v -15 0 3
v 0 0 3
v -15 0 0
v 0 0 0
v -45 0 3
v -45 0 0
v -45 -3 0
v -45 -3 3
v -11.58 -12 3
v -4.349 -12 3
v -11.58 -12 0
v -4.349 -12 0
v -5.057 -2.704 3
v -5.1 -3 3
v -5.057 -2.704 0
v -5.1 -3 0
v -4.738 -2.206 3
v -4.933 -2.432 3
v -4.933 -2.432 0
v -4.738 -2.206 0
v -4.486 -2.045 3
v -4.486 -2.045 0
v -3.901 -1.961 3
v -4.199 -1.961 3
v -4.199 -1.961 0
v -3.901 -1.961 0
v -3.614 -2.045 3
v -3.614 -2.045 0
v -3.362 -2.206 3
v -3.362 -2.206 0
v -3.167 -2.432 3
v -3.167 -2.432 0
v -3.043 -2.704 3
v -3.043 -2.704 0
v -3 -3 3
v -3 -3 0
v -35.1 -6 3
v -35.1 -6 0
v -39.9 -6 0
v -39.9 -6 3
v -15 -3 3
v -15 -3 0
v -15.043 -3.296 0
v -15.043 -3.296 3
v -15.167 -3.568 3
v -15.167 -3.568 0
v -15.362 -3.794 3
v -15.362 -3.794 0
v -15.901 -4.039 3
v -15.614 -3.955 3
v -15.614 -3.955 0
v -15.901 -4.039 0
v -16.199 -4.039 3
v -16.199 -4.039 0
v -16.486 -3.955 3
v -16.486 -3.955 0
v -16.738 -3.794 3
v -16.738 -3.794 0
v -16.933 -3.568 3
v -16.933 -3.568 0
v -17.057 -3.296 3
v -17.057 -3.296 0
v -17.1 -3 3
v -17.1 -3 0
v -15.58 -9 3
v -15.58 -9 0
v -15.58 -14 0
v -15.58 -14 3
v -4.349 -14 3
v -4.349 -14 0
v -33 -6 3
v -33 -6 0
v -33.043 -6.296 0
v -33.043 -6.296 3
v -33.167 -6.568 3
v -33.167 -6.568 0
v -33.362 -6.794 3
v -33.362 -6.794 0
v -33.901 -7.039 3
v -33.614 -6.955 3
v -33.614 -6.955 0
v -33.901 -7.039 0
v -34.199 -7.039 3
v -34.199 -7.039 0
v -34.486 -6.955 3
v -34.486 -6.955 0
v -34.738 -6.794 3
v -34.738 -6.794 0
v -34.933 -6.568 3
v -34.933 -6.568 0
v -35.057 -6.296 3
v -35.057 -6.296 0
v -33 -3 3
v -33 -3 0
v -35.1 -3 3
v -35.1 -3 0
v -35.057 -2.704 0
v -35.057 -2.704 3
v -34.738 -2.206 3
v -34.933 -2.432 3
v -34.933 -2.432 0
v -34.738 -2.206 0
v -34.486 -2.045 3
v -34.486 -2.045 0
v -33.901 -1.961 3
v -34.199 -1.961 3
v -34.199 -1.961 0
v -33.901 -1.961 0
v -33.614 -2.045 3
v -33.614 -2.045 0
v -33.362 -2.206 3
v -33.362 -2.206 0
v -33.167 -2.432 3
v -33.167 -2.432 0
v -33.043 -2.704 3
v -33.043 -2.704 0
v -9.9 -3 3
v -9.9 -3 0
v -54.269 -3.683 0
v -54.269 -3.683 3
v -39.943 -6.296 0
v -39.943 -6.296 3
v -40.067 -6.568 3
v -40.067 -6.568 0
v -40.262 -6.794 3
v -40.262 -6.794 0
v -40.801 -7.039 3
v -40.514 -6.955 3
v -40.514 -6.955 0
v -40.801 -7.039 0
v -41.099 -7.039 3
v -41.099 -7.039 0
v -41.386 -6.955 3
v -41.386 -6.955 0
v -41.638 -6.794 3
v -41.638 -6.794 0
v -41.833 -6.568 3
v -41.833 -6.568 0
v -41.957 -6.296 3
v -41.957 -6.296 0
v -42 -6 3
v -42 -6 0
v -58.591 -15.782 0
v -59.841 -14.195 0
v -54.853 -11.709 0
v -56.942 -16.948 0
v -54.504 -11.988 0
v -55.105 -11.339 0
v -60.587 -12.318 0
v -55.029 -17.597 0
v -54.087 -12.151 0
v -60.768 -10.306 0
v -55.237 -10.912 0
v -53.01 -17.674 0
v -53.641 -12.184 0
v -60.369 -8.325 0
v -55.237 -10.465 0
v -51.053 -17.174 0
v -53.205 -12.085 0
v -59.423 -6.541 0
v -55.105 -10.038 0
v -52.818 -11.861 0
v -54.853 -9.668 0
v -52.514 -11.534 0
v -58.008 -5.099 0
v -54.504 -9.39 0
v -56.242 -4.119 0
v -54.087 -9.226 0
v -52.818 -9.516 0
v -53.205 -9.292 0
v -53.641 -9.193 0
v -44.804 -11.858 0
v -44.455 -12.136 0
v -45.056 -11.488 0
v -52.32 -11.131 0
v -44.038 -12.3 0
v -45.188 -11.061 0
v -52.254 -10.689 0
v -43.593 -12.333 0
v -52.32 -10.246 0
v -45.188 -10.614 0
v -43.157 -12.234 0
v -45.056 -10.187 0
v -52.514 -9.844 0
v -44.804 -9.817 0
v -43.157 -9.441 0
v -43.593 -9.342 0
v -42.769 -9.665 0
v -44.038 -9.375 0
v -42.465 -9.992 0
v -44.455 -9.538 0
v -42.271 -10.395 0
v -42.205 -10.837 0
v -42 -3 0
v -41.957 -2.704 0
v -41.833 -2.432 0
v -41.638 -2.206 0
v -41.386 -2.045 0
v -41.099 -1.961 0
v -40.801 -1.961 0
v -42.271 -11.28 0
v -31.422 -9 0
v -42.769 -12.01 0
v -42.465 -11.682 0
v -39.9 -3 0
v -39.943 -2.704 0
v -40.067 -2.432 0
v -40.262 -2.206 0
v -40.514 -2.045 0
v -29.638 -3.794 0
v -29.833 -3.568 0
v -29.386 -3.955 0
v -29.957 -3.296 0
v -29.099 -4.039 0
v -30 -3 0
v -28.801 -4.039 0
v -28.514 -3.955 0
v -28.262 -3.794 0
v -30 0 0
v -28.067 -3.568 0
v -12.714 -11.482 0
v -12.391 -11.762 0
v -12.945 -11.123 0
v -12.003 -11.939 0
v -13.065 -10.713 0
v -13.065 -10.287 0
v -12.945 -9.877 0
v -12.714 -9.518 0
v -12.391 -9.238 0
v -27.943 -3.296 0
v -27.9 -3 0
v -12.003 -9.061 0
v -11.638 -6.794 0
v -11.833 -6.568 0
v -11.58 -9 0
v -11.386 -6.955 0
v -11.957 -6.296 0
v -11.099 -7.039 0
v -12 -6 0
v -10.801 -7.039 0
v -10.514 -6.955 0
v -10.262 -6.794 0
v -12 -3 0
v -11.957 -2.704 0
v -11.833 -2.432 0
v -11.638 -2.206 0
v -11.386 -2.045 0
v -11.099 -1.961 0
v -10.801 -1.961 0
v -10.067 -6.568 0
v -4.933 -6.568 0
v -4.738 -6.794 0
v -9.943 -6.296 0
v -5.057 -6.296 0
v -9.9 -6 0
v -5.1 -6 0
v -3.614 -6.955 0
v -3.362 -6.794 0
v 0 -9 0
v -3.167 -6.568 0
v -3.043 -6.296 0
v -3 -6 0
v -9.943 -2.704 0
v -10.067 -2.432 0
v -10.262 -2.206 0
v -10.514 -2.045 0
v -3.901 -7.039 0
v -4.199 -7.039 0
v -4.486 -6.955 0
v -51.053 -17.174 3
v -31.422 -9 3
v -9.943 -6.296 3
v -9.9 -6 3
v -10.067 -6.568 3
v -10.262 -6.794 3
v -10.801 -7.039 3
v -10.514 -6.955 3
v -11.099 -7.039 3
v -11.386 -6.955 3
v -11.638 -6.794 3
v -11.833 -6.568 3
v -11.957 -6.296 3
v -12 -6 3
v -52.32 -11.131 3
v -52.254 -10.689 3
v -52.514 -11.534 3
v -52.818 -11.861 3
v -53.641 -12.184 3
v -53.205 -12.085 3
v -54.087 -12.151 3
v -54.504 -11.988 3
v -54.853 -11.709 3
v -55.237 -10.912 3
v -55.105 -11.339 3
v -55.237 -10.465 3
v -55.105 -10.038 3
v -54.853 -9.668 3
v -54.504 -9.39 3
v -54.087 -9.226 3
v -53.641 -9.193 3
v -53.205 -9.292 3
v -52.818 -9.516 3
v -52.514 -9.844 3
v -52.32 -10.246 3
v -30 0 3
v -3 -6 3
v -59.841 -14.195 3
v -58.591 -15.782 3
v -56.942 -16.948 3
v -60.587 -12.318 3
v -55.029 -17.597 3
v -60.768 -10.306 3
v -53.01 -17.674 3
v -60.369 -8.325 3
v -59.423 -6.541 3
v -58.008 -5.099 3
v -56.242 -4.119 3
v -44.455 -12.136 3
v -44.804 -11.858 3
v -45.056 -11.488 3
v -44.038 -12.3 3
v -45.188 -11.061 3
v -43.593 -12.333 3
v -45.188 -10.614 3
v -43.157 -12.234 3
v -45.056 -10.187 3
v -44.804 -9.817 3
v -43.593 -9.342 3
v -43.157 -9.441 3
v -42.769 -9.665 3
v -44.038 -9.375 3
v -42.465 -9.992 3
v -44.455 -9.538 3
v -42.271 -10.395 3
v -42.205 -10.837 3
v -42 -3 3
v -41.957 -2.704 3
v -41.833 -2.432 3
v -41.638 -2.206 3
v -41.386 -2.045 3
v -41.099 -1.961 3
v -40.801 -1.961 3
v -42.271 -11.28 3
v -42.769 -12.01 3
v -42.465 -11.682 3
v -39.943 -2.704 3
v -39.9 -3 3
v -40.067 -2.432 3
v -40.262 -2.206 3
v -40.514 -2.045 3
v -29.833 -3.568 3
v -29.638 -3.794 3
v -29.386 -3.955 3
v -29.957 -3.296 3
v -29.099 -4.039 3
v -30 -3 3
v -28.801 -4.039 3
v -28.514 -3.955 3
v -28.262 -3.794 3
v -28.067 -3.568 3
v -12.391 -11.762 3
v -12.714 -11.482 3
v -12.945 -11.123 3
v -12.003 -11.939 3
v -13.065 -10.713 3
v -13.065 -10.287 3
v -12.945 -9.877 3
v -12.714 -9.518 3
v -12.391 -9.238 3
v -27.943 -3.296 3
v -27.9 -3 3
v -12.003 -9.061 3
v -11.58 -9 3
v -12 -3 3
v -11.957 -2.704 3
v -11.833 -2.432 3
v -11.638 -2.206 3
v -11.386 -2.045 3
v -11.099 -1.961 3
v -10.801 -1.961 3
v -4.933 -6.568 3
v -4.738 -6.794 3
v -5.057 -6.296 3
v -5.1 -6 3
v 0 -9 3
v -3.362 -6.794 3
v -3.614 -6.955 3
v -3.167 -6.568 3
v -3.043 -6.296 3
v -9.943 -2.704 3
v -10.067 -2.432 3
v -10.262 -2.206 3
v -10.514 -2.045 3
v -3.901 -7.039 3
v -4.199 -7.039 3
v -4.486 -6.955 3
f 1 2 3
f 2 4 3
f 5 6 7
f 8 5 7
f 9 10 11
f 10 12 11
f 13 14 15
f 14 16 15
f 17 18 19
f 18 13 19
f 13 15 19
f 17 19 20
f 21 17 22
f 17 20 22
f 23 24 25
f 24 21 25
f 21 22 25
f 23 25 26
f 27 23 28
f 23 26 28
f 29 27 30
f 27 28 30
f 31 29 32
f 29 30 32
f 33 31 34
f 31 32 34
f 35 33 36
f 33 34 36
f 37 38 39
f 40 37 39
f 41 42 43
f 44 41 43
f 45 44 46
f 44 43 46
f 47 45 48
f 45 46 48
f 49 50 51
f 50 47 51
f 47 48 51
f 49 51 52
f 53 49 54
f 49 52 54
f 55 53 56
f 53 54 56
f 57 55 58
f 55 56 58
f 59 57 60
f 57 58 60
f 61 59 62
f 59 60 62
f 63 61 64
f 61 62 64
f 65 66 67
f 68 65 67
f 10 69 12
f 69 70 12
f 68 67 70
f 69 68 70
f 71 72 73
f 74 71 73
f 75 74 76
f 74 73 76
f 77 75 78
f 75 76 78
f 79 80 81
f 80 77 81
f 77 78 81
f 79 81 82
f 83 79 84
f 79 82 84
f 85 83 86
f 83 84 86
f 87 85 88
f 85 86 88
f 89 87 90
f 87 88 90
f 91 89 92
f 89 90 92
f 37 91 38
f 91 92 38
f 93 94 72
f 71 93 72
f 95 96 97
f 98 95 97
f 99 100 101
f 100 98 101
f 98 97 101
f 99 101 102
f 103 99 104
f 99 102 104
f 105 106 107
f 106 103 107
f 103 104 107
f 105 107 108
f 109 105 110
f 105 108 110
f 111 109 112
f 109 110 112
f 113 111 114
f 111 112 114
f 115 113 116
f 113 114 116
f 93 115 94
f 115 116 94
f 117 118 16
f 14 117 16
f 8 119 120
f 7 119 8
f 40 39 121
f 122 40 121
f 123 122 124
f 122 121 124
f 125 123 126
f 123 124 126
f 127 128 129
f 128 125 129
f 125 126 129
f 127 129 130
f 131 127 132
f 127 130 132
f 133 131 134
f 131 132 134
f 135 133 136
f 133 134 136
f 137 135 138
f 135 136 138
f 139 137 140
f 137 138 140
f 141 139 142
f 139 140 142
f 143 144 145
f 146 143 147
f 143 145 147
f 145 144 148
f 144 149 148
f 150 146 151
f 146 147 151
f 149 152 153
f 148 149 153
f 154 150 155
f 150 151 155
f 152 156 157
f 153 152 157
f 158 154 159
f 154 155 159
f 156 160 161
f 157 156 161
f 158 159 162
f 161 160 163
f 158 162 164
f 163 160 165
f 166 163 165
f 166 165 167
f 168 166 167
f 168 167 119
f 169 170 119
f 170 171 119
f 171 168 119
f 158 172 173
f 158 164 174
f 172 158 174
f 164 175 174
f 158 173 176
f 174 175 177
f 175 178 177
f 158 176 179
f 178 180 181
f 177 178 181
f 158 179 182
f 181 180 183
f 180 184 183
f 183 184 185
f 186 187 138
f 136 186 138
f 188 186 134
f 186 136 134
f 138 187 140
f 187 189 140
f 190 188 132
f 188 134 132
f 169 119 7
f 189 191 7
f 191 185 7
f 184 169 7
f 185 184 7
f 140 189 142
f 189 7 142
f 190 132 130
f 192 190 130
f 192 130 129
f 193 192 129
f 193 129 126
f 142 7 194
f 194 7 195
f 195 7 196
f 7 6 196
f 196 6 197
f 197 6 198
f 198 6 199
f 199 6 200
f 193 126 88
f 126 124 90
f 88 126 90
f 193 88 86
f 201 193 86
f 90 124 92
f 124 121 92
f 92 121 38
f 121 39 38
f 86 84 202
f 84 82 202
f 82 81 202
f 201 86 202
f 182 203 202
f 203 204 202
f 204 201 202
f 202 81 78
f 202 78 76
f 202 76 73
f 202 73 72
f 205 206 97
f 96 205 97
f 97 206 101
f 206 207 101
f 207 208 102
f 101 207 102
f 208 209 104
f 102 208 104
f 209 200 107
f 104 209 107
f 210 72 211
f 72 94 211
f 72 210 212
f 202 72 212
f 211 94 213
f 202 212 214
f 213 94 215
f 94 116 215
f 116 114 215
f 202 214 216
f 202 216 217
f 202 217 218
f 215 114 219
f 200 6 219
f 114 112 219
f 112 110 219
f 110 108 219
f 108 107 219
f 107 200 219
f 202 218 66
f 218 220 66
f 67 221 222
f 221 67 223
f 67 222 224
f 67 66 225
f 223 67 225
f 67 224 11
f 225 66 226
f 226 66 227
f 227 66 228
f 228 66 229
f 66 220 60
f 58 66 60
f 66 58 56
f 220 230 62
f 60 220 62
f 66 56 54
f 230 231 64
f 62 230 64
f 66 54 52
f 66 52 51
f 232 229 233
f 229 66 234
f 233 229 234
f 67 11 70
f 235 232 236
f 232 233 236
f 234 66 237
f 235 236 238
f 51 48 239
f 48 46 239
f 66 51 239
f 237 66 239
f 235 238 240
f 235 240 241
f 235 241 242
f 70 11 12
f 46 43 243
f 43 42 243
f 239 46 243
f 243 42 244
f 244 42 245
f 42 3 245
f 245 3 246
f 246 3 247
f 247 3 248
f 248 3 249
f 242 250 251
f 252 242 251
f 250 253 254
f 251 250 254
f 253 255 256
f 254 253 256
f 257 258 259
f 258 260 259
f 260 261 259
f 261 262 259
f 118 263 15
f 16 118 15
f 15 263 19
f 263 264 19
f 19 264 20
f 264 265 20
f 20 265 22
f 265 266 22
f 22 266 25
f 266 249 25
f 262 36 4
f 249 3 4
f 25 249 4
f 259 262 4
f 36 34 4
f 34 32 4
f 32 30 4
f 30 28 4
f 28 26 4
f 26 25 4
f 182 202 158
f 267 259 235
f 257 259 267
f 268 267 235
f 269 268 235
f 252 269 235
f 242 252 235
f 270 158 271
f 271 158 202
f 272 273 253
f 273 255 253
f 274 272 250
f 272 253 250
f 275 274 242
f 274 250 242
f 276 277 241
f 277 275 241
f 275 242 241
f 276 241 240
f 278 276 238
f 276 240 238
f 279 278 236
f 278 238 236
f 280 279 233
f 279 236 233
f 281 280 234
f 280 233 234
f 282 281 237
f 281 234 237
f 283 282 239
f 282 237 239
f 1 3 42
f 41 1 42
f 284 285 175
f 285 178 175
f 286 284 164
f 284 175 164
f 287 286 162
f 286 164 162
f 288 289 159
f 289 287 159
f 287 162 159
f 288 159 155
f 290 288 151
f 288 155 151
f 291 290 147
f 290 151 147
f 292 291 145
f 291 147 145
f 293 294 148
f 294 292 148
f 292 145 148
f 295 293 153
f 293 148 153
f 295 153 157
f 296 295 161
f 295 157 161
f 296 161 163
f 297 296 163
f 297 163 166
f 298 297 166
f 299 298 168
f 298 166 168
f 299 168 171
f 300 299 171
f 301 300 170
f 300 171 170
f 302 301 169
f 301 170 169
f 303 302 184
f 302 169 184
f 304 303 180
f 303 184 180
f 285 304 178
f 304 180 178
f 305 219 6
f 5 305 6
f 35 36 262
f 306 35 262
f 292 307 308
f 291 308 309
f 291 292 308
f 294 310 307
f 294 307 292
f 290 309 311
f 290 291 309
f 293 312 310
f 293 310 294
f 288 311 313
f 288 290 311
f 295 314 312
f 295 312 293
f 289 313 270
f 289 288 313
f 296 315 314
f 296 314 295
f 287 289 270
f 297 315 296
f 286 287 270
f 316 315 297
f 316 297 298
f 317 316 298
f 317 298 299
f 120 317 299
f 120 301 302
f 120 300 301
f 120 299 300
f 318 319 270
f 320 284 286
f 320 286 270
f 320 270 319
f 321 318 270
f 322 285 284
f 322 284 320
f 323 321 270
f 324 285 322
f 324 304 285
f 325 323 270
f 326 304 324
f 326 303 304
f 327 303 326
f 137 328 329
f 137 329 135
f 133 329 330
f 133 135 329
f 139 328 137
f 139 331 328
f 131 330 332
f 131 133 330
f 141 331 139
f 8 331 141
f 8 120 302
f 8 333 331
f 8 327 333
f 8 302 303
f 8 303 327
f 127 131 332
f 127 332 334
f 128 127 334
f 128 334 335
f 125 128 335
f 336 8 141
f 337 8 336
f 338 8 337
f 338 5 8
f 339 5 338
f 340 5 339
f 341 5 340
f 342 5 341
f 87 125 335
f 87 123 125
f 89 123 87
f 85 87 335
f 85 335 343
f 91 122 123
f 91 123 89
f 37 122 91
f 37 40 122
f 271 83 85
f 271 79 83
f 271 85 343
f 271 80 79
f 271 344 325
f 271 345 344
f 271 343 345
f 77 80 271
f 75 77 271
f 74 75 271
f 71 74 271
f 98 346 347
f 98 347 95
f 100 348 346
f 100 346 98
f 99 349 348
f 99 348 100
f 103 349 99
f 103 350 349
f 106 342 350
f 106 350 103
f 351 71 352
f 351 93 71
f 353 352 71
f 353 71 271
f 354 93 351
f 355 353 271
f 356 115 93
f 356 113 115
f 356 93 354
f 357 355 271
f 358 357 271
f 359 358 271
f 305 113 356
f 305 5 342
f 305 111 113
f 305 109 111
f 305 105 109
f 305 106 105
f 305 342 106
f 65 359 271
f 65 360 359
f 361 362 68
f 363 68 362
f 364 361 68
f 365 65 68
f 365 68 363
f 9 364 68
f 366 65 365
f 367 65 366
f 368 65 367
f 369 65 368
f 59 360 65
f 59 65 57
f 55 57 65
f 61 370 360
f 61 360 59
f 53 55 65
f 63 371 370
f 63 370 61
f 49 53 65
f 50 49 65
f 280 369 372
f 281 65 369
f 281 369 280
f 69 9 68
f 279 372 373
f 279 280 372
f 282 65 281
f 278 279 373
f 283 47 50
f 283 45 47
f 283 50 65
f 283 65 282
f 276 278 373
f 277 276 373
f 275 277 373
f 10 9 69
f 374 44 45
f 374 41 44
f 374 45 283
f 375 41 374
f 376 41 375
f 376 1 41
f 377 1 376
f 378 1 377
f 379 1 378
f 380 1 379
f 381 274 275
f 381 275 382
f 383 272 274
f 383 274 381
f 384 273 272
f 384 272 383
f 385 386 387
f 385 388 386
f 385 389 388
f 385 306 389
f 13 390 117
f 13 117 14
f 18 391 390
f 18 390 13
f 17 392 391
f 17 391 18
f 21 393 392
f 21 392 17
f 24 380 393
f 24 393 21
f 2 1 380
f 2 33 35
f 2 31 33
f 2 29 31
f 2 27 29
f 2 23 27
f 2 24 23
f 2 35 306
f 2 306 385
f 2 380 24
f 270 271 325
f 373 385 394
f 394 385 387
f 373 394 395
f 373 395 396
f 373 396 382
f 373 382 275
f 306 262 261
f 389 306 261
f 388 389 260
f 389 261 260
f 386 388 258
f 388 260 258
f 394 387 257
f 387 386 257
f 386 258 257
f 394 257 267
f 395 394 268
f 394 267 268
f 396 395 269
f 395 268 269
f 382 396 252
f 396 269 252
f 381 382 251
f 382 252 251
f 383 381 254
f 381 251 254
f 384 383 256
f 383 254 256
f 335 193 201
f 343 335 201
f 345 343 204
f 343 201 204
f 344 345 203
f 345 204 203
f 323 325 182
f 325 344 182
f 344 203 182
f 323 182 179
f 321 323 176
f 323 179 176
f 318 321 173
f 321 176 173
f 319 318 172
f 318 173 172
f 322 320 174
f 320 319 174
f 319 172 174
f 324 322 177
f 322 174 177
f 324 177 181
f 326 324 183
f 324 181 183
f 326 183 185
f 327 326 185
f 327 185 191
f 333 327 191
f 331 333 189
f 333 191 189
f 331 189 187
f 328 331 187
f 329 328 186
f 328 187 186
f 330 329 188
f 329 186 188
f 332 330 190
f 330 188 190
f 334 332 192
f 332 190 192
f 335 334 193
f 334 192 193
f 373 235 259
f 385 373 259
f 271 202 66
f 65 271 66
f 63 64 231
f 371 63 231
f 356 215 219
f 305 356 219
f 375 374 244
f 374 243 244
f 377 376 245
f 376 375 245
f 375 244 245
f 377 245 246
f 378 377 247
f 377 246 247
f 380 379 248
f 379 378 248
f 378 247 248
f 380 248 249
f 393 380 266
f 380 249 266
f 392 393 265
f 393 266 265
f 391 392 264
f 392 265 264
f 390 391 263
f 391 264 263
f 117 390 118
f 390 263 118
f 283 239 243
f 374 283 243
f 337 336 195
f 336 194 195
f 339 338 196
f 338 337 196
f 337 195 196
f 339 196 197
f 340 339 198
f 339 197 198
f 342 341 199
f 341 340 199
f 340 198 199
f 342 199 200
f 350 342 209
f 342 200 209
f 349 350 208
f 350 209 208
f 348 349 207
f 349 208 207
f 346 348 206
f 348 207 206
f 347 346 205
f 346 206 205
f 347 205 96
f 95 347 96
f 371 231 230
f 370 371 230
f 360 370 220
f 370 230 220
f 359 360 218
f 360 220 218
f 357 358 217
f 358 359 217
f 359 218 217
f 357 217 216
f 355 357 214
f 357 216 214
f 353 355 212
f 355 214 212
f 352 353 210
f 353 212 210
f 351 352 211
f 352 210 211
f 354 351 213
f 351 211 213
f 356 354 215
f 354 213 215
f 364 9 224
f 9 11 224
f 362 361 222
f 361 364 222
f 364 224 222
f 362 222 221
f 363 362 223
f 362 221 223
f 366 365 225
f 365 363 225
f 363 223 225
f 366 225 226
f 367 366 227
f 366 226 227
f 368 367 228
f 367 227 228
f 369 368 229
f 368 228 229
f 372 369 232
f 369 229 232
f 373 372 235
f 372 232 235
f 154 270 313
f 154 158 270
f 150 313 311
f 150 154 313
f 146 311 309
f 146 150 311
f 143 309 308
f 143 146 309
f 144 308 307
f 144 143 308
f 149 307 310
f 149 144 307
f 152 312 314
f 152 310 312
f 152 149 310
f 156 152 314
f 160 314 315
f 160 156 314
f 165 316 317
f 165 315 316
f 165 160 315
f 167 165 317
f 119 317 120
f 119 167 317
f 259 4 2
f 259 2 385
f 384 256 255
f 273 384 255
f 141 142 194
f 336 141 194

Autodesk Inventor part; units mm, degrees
ref_plane "YZ Plane" through (0, 0, 0) normal (1, 0, 0) x (0, 1, 0)
ref_plane "XZ Plane" through (0, 0, 0) normal (0, 1, 0) x (-1, 0, 0)
ref_plane "XY Plane" through (0, 0, 0) normal (0, 0, 1) x (1, 0, 0)
sketch "スケッチ1" plane through (0, 0, 0) normal (0, 0, 1) x (1, 0, 0)
  line L0 (0, 0) -> (0, -3)
  line L1 (0, 0) -> (-15, 0)
  line L2 (-15, 0) -> (-15, -3)
  line L3 (-15, -3) -> (-30, -3)
  line L4 (-30, -3) -> (-30, 0)
  line L5 (-30, 0) -> (-45, 0)
  line L6 (-45, 0) -> (-45, -3)
  line L7 (-257.4775, 0) -> (-66.4062, 0)
  line L8 (-66.4062, 0) -> (-51.9242, -3.906)
  line L9 (-257.4775, 0) -> (-257.4775, -3)
  line L10 (-257.4775, -3) -> (-68.9626, -6)
  line L11 (-68.9626, -6) -> (-58.5737, -15.799)
  circle A0 centre (-53.7535, -10.6886) radius 4.025
  circle A1 centre (-53.7535, -10.6886) radius 1.5
  line L12 (0, -3) -> (0, -9)
  arc A2 (-54.2694, -3.6826) -> (-51.0532, -17.1739) centre (-53.7535, -10.6886) ccw
  line L13 (-54.2694, -3.6826) -> (-45, -3)
  line L14 (-51.0532, -17.1739) -> (-31.4218, -9)
  line L15 (-31.4218, -9) -> (0, -9)
  arc A3 (-46.7293, -10.7926) -> (-42.5418, -13.63) centre (-43.7046, -10.8374) ccw
  circle A4 centre (-43.7046, -10.8374) radius 1.5
  line L16 (-54.6828, -17.6519) -> (-41.7856, -19.3732)
  arc A5 (-41.7856, -19.3732) -> (-42.5418, -13.63) centre (-41.3887, -16.3996) ccw
  arc A6 (-58.5737, -15.799) -> (-54.6828, -17.6519) centre (-53.7535, -10.6886) ccw
  arc A7 (-46.7293, -10.7926) -> (-51.9242, -3.906) centre (-53.7535, -10.6886) ccw
  line L17 (-42, -3) -> (-33, -3)
  line L18 (-33, -3) -> (-33, -6)
  line L19 (-33, -6) -> (-42, -6)
  line L20 (-42, -6) -> (-42, -3)
  line L21 (-12, -3) -> (-3, -3)
  line L22 (-3, -3) -> (-3, -6)
  line L23 (-3, -6) -> (-12, -6)
  line L24 (-12, -6) -> (-12, -3)
  circle A8 centre (-40.95, -3) radius 1.05
  circle A9 centre (-34.05, -3) radius 1.05
  circle A10 centre (-34.05, -6) radius 1.05
  circle A11 centre (-40.95, -6) radius 1.05
  circle A12 centre (-10.95, -3) radius 1.05
  circle A13 centre (-4.05, -3) radius 1.05
  circle A14 centre (-4.05, -6) radius 1.05
  circle A15 centre (-10.95, -6) radius 1.05
  circle A16 centre (-28.95, -3) radius 1.05
  circle A17 centre (-16.05, -3) radius 1.05
  circle A18 centre (-41.3887, -16.3996) radius 1.25
  line L25 (-15.5802, -9) -> (-15.5802, -14)
  line L26 (-15.5802, -14) -> (-4.3492, -14)
  line L27 (-4.3492, -14) -> (-4.3492, -12)
  line L28 (-4.3492, -12) -> (-11.5802, -12)
  arc A19 (-11.5802, -9) -> (-11.5802, -12) centre (-11.5802, -10.5) ccw
  point P0 (-5.1, -6)
  point P1 (-9.9, -6)
  point P2 (-9.9, -3)
  point P3 (-5.1, -3)
  point P4 (-35.1, -6)
  point P5 (-39.9, -6)
  point P6 (-39.9, -3)
  point P7 (-35.1, -3)
  point P8 (-17.1, -3)
  point P9 (-27.9, -3)
  dimension "d0" = 3
  dimension "d1" = 15
  dimension "d2" = 3
  dimension "d3" = 15
  dimension "d5" = 15
  dimension "d6" = 3
  dimension "d7" = 3
  dimension "d8" = 8.05
  dimension "d10" = 3
  dimension "d11" = 6
  dimension "d12" = 6
  dimension "d13" = 6.05
  dimension "d14" = 3
  dimension "d15" = 9
  dimension "d16" = 3
  dimension "d17" = 9
  dimension "d18" = 3
  dimension "d19" = 3
  dimension "d20" = 3
  dimension "d21" = 3
  dimension "d22" = 3
  dimension "d23" = 3
  dimension "d24" = 2.1
  dimension "d25" = 2.1
  dimension "d26" = 2.1
  dimension "d27" = 2.1
  dimension "d28" = 2.1
  dimension "d29" = 2.1
  dimension "d30" = 2.1
  dimension "d31" = 2.1
  dimension "d32" = 2.1
  dimension "d33" = 2.1
  dimension "d34" = 2.5
  dimension "d36" = 3
  dimension "d37" = 3
  dimension "d38" = 2
  dimension "d39" = 4
extrude "押し出し1" add sketch "スケッチ1" along normal blind 3 contours L0 L12 L15 L14 A3 A7 L8 L13 L6 L5 L4 A16 L3 A17 L2 L1 | A19 L28 L27 L26 L25 L15 | L14 A2 L13 L8 A7 A3 | A0
properties part number "シールド先端接続"
